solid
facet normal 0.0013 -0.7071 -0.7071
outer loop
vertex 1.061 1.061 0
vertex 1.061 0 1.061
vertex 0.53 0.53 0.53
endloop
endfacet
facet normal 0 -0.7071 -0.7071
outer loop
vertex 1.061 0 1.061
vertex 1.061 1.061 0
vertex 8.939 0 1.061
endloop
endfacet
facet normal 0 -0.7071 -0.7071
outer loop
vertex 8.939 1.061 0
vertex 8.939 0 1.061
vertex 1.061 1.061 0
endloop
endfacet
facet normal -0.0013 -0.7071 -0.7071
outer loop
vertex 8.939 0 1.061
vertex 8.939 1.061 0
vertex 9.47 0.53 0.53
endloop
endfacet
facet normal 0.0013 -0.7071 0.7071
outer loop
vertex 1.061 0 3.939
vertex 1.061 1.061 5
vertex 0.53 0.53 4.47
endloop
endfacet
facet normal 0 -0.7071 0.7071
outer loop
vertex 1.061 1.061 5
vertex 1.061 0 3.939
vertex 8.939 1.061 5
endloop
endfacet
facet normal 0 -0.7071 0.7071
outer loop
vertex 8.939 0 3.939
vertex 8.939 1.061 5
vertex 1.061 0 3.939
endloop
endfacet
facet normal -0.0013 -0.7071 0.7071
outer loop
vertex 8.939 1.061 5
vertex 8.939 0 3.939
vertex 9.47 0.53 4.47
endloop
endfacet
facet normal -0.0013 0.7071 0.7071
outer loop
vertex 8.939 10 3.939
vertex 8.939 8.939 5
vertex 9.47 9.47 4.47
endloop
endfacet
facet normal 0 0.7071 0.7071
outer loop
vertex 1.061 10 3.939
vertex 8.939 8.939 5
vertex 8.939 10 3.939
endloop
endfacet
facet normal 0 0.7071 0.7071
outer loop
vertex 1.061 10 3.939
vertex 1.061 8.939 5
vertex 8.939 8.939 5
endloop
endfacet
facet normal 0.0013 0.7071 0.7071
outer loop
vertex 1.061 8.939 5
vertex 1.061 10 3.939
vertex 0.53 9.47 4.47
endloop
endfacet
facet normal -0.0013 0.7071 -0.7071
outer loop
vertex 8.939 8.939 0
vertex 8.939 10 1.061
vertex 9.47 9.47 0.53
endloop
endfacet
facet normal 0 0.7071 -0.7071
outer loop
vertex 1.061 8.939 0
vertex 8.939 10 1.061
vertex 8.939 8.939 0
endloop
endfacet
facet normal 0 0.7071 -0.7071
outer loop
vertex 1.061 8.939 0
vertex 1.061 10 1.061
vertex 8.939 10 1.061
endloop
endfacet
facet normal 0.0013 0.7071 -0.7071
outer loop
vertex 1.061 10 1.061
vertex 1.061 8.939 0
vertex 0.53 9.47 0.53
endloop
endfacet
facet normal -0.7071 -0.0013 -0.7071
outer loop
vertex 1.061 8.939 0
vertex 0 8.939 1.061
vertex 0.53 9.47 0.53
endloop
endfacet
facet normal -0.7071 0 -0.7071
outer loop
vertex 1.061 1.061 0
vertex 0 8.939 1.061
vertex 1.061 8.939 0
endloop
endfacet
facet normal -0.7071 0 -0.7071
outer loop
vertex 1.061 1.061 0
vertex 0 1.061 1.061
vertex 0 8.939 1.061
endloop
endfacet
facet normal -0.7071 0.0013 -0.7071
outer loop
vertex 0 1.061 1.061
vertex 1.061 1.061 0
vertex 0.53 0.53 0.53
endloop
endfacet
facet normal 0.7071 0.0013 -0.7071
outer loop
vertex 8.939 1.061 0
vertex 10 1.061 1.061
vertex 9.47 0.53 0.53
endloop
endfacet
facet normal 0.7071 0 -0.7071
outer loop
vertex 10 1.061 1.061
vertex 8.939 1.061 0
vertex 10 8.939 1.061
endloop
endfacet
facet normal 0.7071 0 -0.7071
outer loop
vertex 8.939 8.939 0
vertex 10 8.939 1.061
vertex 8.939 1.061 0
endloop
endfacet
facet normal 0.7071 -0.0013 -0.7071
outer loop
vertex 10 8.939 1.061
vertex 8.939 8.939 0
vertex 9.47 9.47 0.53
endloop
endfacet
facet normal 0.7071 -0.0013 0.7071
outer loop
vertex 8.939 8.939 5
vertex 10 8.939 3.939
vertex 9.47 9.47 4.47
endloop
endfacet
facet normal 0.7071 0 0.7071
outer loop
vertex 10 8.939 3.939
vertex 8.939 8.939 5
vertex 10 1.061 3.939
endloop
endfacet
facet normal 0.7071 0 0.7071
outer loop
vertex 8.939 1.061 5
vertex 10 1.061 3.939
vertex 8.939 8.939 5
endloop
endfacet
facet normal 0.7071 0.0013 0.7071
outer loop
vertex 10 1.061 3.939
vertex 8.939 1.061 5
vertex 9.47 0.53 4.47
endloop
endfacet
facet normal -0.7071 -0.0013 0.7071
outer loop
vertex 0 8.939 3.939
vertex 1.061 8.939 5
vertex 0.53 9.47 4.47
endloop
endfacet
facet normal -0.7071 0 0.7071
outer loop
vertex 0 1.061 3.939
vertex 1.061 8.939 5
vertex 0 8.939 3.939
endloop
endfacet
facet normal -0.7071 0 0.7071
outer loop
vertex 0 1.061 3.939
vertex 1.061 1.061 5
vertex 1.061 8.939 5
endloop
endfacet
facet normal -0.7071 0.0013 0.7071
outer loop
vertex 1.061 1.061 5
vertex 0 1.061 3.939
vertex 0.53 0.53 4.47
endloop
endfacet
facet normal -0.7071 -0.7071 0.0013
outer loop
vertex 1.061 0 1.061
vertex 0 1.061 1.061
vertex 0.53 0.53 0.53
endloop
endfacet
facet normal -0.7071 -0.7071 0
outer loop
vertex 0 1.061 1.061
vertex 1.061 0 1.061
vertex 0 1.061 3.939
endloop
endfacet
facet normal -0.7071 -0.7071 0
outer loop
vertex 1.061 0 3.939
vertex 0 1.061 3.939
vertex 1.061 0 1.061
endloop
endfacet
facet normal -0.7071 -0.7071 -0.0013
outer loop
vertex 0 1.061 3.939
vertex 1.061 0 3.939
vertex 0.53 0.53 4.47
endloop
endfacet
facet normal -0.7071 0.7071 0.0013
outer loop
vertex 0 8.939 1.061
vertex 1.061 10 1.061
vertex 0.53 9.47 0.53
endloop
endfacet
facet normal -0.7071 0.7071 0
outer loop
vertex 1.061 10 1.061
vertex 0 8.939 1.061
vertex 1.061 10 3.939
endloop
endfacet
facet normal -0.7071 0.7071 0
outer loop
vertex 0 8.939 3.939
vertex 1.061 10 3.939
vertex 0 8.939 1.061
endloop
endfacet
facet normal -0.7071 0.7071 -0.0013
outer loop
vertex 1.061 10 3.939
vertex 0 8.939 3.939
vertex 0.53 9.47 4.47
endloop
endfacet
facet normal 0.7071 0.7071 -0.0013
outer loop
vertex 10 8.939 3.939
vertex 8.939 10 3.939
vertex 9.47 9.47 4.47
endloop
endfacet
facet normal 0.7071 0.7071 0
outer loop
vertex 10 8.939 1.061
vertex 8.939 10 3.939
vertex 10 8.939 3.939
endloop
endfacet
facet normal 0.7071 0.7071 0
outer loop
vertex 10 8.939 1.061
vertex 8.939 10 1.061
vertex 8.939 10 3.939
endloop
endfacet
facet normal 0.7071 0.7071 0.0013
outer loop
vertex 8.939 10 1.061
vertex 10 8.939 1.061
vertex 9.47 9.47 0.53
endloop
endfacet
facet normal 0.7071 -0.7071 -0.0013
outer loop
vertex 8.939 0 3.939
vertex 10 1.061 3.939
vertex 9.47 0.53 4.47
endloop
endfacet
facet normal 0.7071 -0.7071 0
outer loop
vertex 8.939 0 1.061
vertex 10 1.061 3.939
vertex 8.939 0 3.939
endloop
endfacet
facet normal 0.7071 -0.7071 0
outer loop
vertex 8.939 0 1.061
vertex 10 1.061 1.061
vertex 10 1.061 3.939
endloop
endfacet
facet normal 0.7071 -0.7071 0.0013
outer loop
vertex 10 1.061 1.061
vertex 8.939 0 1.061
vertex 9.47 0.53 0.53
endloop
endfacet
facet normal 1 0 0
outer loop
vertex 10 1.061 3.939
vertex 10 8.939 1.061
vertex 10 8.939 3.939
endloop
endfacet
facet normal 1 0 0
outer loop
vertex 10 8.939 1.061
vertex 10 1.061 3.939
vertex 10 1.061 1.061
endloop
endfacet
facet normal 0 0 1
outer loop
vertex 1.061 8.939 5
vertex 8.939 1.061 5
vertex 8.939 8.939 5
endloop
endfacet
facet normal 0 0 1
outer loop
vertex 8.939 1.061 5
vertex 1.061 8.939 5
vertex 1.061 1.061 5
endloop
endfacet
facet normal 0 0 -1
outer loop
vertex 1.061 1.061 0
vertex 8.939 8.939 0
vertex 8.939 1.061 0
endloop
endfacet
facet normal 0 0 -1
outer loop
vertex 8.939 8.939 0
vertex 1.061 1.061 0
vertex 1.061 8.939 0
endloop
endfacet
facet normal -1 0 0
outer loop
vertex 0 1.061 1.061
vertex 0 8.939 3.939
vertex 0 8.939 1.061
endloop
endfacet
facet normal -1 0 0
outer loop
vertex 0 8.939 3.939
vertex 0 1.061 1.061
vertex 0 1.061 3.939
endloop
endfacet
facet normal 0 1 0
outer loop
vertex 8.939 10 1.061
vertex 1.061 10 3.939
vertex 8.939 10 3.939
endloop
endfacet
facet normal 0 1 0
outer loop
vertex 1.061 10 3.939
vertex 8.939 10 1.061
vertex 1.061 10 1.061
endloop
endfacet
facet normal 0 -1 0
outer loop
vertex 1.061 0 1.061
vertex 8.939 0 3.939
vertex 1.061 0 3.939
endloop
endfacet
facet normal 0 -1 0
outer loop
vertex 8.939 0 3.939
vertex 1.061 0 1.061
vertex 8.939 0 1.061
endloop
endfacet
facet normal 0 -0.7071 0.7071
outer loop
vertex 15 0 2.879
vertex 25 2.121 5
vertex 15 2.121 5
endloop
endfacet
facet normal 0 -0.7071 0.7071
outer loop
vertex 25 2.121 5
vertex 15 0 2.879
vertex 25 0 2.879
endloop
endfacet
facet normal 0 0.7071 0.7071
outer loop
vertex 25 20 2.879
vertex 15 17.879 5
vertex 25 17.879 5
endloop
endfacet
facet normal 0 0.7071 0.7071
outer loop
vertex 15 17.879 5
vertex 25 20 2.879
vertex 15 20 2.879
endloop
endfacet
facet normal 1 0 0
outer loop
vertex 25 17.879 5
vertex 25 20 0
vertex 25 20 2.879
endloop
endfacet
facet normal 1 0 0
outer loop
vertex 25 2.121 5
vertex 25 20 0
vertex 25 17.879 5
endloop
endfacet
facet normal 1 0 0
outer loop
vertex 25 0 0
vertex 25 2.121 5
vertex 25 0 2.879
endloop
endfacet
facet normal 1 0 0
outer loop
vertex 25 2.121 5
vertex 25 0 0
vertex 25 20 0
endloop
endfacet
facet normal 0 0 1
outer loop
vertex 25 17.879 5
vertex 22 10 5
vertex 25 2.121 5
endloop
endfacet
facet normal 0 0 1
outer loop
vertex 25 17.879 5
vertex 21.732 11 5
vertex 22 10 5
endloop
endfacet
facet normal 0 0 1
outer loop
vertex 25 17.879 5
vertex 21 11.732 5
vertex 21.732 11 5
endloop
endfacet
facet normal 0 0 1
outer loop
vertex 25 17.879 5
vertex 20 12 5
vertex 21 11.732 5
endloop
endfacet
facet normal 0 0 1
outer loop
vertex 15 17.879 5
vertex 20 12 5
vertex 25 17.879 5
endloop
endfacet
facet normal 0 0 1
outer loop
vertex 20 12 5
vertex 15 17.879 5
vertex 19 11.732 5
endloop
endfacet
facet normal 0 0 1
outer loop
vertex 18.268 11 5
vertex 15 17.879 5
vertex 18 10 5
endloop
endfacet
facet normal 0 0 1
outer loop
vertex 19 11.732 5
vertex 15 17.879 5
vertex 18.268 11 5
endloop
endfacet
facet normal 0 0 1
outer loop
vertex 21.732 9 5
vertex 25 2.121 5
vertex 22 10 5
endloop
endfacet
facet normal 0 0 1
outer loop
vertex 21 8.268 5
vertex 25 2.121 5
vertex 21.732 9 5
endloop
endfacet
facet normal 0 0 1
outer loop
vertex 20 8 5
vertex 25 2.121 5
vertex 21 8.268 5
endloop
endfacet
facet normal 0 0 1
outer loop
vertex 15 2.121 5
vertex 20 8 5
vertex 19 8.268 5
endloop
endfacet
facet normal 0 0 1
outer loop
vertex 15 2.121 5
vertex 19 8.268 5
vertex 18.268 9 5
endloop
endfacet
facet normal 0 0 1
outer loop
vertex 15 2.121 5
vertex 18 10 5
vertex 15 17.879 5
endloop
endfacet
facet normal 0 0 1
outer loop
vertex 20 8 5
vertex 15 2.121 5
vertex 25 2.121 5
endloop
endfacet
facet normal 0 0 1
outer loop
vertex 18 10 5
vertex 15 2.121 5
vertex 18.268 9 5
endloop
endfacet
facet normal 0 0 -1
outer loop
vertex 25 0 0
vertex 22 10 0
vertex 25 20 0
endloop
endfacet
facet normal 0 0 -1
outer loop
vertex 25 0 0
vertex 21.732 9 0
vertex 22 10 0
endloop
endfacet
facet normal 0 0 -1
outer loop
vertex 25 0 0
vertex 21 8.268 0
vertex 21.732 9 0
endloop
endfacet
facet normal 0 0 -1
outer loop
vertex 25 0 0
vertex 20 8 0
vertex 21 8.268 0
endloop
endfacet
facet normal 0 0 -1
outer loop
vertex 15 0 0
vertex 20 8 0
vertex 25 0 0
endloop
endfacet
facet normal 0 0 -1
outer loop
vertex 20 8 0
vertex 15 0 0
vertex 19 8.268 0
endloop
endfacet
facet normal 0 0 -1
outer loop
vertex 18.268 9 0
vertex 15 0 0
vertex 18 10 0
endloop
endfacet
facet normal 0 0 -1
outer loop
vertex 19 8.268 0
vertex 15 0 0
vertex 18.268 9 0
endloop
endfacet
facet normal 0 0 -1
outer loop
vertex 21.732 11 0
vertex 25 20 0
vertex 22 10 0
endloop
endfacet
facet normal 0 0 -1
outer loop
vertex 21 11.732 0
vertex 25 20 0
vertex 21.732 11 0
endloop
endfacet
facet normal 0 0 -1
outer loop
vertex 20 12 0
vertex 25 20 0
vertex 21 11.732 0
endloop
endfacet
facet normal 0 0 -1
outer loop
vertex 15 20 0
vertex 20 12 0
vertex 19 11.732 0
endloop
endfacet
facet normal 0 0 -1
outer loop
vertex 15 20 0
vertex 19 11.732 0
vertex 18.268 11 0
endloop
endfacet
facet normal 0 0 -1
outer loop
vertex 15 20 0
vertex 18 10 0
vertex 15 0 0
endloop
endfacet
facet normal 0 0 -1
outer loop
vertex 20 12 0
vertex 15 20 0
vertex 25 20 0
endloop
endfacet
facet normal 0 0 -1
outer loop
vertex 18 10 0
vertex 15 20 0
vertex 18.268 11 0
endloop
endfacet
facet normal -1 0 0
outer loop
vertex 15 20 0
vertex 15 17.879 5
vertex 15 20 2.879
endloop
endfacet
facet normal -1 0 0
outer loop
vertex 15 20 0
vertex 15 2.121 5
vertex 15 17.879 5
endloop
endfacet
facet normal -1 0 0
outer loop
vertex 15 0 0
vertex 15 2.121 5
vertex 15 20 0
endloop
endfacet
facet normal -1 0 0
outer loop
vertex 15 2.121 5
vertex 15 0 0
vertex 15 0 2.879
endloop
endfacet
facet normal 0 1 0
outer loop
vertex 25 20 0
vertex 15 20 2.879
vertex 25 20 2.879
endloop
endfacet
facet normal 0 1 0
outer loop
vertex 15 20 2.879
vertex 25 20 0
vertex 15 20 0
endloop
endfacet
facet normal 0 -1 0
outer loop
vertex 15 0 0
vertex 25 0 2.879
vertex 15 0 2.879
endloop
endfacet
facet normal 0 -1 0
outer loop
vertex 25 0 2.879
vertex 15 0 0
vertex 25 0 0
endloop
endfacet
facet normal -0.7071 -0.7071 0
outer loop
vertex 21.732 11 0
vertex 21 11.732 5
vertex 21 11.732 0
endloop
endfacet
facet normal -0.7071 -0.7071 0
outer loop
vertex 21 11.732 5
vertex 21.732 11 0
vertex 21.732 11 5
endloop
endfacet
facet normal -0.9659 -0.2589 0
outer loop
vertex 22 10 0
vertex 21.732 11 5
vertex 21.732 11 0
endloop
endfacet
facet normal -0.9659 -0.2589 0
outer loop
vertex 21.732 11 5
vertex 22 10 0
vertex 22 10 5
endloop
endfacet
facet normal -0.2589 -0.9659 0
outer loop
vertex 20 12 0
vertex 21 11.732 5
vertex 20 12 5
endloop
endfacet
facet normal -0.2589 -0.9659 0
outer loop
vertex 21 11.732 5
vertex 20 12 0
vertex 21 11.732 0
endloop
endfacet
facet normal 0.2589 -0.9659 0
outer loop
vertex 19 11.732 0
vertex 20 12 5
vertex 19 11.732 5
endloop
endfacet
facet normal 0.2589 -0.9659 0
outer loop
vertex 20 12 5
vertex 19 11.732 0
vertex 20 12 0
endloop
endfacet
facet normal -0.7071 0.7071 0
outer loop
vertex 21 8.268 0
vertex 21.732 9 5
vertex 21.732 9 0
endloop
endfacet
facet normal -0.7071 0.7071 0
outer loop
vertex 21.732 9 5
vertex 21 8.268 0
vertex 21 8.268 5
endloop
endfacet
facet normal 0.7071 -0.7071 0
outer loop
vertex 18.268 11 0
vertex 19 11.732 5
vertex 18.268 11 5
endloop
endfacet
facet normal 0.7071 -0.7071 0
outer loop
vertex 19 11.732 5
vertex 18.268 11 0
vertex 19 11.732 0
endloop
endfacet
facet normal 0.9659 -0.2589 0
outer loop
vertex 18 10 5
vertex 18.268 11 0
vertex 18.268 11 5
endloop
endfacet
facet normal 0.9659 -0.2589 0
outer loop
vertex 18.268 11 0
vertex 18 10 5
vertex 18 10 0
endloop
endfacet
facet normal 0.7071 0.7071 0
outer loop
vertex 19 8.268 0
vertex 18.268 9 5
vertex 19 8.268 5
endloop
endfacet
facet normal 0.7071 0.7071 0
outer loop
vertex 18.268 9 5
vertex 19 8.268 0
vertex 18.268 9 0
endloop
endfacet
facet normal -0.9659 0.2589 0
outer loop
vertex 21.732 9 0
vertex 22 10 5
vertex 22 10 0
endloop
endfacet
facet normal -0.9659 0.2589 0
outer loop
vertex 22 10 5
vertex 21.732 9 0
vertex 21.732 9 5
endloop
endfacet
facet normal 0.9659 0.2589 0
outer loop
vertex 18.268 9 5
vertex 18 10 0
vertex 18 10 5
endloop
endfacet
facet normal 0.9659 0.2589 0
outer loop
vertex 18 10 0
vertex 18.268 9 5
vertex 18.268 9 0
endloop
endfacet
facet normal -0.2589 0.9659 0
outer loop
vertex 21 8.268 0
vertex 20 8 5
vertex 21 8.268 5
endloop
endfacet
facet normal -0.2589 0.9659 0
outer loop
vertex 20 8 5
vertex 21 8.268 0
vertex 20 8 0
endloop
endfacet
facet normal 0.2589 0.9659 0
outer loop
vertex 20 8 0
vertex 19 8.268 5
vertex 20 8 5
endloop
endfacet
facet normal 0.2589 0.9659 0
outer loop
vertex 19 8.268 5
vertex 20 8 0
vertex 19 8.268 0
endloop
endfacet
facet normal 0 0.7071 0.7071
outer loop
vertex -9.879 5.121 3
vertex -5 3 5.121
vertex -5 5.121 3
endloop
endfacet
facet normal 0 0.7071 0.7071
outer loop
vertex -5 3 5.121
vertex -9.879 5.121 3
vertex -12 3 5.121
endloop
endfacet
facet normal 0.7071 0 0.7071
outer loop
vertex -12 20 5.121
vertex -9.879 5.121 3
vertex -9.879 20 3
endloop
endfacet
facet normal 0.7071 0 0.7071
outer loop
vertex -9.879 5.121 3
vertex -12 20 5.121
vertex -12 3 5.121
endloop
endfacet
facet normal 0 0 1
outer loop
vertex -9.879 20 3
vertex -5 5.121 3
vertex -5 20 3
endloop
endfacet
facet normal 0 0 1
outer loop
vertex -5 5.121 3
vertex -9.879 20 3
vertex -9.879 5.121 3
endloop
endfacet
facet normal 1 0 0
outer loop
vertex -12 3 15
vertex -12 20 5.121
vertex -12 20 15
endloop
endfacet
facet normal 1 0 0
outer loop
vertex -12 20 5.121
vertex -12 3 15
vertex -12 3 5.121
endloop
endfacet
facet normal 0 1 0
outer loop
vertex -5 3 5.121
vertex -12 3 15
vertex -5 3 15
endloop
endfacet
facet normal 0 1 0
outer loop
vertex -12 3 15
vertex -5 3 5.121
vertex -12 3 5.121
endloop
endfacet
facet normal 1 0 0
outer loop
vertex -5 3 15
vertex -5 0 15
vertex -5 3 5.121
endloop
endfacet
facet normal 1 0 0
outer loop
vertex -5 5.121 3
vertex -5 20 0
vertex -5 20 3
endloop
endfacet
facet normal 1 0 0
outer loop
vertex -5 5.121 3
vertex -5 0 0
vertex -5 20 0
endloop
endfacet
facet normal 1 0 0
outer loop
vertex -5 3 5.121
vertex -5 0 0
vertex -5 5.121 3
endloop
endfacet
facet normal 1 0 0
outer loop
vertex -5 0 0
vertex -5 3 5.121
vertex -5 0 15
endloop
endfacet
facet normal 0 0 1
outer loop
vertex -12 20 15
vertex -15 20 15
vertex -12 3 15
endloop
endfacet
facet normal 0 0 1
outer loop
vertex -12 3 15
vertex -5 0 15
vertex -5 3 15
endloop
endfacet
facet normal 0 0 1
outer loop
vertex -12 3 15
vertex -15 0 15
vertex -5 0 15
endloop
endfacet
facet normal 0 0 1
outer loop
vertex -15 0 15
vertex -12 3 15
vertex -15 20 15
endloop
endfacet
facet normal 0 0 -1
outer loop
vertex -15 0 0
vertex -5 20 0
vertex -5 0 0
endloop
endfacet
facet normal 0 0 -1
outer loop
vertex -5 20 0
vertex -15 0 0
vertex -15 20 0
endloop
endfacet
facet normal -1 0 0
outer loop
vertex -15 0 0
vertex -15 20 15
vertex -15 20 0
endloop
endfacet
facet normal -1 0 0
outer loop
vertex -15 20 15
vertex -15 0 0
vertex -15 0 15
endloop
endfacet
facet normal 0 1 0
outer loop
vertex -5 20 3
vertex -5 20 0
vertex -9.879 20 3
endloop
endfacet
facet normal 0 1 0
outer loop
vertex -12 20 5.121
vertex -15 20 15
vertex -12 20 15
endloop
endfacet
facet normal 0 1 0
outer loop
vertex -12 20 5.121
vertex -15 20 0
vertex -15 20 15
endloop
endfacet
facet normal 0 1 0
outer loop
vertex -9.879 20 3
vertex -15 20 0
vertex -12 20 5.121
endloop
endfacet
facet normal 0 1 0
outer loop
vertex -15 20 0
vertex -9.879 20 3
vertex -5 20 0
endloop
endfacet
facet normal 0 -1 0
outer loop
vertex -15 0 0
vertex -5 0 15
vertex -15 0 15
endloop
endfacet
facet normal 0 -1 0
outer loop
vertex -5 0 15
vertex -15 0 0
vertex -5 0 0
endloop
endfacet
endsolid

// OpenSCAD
// -----------------
// module cubo
// GPL v2.0
// yvoz.lg@gmail.com
// -----------------


// exemples ----

cubo([10,10,5], [1,2,3,4,5,6,7,8,9,10,11,12], 1.5);

translate([15, 0, 0]){
	difference(){
		cubo([10,20,5], [2,3], 3);
		translate([5,10,-1]) cylinder(r=2, h=7, $fn=12);
	}
}

translate([-15, 0, 0]){
	difference(){
		cube([10,20,15]);
		translate([3,3,3]) cubo([10,20,50], [1,5], 3);
	}
}

// ------------

module cubo(dim, cro, a){

	diago = sqrt(pow(a,2)+pow(a,2));
	difference(){
		cube(dim);
		
		for(i=cro){
			//x
			if(i==1){
				translate([-1, 0, -diago/2])
				rotate([45, 0, 0])
				cube([dim.x+2, a, a]);
			}
			if(i==2){
				translate([-1, 0, dim.z-diago/2])
				rotate([45, 0, 0])
				cube([dim.x+2, a, a]);
			}
			if(i==3){
				translate([-1, dim.y, dim.z-diago/2])
				rotate([45, 0, 0])
				cube([dim.x+2, a, a]);
			}
			if(i==4){
				translate([-1, dim.y, -diago/2])
				rotate([45, 0, 0])
				cube([dim.x+2, a, a]);
			}
			//y
			if(i==5){
				translate([-diago/2, -1, 0])
				rotate([0, 45, 0])
				cube([a, dim.y+2, a]);
			}
			if(i==6){
				translate([dim.x-diago/2, -1, 0])
				rotate([0, 45, 0])
				cube([a, dim.y+2, a]);
			}
			if(i==7){
				translate([dim.x-diago/2, -1, dim.z])
				rotate([0, 45, 0])
				cube([a, dim.y+2, a]);
			}
			if(i==8){
				translate([-diago/2, -1, dim.z])
				rotate([0, 45, 0])
				cube([a, dim.y+2, a]);
			}
			//z
			if(i==9){
				translate([0, -diago/2, -1])
				rotate([0, 0, 45])
				cube([a, a, dim.z+2]);
			}
			if(i==10){
				translate([0, dim.y-diago/2, -1])
				rotate([0, 0, 45])
				cube([a, a, dim.z+2]);
			}
			if(i==11){
				translate([dim.x, dim.y-diago/2, -1])
				rotate([0, 0, 45])
				cube([a, a, dim.z+2]);
			}
			if(i==12){
				translate([dim.x, -diago/2, -1])
				rotate([0, 0, 45])
				cube([a, a, dim.z+2]);
			}
		}
	}
}
